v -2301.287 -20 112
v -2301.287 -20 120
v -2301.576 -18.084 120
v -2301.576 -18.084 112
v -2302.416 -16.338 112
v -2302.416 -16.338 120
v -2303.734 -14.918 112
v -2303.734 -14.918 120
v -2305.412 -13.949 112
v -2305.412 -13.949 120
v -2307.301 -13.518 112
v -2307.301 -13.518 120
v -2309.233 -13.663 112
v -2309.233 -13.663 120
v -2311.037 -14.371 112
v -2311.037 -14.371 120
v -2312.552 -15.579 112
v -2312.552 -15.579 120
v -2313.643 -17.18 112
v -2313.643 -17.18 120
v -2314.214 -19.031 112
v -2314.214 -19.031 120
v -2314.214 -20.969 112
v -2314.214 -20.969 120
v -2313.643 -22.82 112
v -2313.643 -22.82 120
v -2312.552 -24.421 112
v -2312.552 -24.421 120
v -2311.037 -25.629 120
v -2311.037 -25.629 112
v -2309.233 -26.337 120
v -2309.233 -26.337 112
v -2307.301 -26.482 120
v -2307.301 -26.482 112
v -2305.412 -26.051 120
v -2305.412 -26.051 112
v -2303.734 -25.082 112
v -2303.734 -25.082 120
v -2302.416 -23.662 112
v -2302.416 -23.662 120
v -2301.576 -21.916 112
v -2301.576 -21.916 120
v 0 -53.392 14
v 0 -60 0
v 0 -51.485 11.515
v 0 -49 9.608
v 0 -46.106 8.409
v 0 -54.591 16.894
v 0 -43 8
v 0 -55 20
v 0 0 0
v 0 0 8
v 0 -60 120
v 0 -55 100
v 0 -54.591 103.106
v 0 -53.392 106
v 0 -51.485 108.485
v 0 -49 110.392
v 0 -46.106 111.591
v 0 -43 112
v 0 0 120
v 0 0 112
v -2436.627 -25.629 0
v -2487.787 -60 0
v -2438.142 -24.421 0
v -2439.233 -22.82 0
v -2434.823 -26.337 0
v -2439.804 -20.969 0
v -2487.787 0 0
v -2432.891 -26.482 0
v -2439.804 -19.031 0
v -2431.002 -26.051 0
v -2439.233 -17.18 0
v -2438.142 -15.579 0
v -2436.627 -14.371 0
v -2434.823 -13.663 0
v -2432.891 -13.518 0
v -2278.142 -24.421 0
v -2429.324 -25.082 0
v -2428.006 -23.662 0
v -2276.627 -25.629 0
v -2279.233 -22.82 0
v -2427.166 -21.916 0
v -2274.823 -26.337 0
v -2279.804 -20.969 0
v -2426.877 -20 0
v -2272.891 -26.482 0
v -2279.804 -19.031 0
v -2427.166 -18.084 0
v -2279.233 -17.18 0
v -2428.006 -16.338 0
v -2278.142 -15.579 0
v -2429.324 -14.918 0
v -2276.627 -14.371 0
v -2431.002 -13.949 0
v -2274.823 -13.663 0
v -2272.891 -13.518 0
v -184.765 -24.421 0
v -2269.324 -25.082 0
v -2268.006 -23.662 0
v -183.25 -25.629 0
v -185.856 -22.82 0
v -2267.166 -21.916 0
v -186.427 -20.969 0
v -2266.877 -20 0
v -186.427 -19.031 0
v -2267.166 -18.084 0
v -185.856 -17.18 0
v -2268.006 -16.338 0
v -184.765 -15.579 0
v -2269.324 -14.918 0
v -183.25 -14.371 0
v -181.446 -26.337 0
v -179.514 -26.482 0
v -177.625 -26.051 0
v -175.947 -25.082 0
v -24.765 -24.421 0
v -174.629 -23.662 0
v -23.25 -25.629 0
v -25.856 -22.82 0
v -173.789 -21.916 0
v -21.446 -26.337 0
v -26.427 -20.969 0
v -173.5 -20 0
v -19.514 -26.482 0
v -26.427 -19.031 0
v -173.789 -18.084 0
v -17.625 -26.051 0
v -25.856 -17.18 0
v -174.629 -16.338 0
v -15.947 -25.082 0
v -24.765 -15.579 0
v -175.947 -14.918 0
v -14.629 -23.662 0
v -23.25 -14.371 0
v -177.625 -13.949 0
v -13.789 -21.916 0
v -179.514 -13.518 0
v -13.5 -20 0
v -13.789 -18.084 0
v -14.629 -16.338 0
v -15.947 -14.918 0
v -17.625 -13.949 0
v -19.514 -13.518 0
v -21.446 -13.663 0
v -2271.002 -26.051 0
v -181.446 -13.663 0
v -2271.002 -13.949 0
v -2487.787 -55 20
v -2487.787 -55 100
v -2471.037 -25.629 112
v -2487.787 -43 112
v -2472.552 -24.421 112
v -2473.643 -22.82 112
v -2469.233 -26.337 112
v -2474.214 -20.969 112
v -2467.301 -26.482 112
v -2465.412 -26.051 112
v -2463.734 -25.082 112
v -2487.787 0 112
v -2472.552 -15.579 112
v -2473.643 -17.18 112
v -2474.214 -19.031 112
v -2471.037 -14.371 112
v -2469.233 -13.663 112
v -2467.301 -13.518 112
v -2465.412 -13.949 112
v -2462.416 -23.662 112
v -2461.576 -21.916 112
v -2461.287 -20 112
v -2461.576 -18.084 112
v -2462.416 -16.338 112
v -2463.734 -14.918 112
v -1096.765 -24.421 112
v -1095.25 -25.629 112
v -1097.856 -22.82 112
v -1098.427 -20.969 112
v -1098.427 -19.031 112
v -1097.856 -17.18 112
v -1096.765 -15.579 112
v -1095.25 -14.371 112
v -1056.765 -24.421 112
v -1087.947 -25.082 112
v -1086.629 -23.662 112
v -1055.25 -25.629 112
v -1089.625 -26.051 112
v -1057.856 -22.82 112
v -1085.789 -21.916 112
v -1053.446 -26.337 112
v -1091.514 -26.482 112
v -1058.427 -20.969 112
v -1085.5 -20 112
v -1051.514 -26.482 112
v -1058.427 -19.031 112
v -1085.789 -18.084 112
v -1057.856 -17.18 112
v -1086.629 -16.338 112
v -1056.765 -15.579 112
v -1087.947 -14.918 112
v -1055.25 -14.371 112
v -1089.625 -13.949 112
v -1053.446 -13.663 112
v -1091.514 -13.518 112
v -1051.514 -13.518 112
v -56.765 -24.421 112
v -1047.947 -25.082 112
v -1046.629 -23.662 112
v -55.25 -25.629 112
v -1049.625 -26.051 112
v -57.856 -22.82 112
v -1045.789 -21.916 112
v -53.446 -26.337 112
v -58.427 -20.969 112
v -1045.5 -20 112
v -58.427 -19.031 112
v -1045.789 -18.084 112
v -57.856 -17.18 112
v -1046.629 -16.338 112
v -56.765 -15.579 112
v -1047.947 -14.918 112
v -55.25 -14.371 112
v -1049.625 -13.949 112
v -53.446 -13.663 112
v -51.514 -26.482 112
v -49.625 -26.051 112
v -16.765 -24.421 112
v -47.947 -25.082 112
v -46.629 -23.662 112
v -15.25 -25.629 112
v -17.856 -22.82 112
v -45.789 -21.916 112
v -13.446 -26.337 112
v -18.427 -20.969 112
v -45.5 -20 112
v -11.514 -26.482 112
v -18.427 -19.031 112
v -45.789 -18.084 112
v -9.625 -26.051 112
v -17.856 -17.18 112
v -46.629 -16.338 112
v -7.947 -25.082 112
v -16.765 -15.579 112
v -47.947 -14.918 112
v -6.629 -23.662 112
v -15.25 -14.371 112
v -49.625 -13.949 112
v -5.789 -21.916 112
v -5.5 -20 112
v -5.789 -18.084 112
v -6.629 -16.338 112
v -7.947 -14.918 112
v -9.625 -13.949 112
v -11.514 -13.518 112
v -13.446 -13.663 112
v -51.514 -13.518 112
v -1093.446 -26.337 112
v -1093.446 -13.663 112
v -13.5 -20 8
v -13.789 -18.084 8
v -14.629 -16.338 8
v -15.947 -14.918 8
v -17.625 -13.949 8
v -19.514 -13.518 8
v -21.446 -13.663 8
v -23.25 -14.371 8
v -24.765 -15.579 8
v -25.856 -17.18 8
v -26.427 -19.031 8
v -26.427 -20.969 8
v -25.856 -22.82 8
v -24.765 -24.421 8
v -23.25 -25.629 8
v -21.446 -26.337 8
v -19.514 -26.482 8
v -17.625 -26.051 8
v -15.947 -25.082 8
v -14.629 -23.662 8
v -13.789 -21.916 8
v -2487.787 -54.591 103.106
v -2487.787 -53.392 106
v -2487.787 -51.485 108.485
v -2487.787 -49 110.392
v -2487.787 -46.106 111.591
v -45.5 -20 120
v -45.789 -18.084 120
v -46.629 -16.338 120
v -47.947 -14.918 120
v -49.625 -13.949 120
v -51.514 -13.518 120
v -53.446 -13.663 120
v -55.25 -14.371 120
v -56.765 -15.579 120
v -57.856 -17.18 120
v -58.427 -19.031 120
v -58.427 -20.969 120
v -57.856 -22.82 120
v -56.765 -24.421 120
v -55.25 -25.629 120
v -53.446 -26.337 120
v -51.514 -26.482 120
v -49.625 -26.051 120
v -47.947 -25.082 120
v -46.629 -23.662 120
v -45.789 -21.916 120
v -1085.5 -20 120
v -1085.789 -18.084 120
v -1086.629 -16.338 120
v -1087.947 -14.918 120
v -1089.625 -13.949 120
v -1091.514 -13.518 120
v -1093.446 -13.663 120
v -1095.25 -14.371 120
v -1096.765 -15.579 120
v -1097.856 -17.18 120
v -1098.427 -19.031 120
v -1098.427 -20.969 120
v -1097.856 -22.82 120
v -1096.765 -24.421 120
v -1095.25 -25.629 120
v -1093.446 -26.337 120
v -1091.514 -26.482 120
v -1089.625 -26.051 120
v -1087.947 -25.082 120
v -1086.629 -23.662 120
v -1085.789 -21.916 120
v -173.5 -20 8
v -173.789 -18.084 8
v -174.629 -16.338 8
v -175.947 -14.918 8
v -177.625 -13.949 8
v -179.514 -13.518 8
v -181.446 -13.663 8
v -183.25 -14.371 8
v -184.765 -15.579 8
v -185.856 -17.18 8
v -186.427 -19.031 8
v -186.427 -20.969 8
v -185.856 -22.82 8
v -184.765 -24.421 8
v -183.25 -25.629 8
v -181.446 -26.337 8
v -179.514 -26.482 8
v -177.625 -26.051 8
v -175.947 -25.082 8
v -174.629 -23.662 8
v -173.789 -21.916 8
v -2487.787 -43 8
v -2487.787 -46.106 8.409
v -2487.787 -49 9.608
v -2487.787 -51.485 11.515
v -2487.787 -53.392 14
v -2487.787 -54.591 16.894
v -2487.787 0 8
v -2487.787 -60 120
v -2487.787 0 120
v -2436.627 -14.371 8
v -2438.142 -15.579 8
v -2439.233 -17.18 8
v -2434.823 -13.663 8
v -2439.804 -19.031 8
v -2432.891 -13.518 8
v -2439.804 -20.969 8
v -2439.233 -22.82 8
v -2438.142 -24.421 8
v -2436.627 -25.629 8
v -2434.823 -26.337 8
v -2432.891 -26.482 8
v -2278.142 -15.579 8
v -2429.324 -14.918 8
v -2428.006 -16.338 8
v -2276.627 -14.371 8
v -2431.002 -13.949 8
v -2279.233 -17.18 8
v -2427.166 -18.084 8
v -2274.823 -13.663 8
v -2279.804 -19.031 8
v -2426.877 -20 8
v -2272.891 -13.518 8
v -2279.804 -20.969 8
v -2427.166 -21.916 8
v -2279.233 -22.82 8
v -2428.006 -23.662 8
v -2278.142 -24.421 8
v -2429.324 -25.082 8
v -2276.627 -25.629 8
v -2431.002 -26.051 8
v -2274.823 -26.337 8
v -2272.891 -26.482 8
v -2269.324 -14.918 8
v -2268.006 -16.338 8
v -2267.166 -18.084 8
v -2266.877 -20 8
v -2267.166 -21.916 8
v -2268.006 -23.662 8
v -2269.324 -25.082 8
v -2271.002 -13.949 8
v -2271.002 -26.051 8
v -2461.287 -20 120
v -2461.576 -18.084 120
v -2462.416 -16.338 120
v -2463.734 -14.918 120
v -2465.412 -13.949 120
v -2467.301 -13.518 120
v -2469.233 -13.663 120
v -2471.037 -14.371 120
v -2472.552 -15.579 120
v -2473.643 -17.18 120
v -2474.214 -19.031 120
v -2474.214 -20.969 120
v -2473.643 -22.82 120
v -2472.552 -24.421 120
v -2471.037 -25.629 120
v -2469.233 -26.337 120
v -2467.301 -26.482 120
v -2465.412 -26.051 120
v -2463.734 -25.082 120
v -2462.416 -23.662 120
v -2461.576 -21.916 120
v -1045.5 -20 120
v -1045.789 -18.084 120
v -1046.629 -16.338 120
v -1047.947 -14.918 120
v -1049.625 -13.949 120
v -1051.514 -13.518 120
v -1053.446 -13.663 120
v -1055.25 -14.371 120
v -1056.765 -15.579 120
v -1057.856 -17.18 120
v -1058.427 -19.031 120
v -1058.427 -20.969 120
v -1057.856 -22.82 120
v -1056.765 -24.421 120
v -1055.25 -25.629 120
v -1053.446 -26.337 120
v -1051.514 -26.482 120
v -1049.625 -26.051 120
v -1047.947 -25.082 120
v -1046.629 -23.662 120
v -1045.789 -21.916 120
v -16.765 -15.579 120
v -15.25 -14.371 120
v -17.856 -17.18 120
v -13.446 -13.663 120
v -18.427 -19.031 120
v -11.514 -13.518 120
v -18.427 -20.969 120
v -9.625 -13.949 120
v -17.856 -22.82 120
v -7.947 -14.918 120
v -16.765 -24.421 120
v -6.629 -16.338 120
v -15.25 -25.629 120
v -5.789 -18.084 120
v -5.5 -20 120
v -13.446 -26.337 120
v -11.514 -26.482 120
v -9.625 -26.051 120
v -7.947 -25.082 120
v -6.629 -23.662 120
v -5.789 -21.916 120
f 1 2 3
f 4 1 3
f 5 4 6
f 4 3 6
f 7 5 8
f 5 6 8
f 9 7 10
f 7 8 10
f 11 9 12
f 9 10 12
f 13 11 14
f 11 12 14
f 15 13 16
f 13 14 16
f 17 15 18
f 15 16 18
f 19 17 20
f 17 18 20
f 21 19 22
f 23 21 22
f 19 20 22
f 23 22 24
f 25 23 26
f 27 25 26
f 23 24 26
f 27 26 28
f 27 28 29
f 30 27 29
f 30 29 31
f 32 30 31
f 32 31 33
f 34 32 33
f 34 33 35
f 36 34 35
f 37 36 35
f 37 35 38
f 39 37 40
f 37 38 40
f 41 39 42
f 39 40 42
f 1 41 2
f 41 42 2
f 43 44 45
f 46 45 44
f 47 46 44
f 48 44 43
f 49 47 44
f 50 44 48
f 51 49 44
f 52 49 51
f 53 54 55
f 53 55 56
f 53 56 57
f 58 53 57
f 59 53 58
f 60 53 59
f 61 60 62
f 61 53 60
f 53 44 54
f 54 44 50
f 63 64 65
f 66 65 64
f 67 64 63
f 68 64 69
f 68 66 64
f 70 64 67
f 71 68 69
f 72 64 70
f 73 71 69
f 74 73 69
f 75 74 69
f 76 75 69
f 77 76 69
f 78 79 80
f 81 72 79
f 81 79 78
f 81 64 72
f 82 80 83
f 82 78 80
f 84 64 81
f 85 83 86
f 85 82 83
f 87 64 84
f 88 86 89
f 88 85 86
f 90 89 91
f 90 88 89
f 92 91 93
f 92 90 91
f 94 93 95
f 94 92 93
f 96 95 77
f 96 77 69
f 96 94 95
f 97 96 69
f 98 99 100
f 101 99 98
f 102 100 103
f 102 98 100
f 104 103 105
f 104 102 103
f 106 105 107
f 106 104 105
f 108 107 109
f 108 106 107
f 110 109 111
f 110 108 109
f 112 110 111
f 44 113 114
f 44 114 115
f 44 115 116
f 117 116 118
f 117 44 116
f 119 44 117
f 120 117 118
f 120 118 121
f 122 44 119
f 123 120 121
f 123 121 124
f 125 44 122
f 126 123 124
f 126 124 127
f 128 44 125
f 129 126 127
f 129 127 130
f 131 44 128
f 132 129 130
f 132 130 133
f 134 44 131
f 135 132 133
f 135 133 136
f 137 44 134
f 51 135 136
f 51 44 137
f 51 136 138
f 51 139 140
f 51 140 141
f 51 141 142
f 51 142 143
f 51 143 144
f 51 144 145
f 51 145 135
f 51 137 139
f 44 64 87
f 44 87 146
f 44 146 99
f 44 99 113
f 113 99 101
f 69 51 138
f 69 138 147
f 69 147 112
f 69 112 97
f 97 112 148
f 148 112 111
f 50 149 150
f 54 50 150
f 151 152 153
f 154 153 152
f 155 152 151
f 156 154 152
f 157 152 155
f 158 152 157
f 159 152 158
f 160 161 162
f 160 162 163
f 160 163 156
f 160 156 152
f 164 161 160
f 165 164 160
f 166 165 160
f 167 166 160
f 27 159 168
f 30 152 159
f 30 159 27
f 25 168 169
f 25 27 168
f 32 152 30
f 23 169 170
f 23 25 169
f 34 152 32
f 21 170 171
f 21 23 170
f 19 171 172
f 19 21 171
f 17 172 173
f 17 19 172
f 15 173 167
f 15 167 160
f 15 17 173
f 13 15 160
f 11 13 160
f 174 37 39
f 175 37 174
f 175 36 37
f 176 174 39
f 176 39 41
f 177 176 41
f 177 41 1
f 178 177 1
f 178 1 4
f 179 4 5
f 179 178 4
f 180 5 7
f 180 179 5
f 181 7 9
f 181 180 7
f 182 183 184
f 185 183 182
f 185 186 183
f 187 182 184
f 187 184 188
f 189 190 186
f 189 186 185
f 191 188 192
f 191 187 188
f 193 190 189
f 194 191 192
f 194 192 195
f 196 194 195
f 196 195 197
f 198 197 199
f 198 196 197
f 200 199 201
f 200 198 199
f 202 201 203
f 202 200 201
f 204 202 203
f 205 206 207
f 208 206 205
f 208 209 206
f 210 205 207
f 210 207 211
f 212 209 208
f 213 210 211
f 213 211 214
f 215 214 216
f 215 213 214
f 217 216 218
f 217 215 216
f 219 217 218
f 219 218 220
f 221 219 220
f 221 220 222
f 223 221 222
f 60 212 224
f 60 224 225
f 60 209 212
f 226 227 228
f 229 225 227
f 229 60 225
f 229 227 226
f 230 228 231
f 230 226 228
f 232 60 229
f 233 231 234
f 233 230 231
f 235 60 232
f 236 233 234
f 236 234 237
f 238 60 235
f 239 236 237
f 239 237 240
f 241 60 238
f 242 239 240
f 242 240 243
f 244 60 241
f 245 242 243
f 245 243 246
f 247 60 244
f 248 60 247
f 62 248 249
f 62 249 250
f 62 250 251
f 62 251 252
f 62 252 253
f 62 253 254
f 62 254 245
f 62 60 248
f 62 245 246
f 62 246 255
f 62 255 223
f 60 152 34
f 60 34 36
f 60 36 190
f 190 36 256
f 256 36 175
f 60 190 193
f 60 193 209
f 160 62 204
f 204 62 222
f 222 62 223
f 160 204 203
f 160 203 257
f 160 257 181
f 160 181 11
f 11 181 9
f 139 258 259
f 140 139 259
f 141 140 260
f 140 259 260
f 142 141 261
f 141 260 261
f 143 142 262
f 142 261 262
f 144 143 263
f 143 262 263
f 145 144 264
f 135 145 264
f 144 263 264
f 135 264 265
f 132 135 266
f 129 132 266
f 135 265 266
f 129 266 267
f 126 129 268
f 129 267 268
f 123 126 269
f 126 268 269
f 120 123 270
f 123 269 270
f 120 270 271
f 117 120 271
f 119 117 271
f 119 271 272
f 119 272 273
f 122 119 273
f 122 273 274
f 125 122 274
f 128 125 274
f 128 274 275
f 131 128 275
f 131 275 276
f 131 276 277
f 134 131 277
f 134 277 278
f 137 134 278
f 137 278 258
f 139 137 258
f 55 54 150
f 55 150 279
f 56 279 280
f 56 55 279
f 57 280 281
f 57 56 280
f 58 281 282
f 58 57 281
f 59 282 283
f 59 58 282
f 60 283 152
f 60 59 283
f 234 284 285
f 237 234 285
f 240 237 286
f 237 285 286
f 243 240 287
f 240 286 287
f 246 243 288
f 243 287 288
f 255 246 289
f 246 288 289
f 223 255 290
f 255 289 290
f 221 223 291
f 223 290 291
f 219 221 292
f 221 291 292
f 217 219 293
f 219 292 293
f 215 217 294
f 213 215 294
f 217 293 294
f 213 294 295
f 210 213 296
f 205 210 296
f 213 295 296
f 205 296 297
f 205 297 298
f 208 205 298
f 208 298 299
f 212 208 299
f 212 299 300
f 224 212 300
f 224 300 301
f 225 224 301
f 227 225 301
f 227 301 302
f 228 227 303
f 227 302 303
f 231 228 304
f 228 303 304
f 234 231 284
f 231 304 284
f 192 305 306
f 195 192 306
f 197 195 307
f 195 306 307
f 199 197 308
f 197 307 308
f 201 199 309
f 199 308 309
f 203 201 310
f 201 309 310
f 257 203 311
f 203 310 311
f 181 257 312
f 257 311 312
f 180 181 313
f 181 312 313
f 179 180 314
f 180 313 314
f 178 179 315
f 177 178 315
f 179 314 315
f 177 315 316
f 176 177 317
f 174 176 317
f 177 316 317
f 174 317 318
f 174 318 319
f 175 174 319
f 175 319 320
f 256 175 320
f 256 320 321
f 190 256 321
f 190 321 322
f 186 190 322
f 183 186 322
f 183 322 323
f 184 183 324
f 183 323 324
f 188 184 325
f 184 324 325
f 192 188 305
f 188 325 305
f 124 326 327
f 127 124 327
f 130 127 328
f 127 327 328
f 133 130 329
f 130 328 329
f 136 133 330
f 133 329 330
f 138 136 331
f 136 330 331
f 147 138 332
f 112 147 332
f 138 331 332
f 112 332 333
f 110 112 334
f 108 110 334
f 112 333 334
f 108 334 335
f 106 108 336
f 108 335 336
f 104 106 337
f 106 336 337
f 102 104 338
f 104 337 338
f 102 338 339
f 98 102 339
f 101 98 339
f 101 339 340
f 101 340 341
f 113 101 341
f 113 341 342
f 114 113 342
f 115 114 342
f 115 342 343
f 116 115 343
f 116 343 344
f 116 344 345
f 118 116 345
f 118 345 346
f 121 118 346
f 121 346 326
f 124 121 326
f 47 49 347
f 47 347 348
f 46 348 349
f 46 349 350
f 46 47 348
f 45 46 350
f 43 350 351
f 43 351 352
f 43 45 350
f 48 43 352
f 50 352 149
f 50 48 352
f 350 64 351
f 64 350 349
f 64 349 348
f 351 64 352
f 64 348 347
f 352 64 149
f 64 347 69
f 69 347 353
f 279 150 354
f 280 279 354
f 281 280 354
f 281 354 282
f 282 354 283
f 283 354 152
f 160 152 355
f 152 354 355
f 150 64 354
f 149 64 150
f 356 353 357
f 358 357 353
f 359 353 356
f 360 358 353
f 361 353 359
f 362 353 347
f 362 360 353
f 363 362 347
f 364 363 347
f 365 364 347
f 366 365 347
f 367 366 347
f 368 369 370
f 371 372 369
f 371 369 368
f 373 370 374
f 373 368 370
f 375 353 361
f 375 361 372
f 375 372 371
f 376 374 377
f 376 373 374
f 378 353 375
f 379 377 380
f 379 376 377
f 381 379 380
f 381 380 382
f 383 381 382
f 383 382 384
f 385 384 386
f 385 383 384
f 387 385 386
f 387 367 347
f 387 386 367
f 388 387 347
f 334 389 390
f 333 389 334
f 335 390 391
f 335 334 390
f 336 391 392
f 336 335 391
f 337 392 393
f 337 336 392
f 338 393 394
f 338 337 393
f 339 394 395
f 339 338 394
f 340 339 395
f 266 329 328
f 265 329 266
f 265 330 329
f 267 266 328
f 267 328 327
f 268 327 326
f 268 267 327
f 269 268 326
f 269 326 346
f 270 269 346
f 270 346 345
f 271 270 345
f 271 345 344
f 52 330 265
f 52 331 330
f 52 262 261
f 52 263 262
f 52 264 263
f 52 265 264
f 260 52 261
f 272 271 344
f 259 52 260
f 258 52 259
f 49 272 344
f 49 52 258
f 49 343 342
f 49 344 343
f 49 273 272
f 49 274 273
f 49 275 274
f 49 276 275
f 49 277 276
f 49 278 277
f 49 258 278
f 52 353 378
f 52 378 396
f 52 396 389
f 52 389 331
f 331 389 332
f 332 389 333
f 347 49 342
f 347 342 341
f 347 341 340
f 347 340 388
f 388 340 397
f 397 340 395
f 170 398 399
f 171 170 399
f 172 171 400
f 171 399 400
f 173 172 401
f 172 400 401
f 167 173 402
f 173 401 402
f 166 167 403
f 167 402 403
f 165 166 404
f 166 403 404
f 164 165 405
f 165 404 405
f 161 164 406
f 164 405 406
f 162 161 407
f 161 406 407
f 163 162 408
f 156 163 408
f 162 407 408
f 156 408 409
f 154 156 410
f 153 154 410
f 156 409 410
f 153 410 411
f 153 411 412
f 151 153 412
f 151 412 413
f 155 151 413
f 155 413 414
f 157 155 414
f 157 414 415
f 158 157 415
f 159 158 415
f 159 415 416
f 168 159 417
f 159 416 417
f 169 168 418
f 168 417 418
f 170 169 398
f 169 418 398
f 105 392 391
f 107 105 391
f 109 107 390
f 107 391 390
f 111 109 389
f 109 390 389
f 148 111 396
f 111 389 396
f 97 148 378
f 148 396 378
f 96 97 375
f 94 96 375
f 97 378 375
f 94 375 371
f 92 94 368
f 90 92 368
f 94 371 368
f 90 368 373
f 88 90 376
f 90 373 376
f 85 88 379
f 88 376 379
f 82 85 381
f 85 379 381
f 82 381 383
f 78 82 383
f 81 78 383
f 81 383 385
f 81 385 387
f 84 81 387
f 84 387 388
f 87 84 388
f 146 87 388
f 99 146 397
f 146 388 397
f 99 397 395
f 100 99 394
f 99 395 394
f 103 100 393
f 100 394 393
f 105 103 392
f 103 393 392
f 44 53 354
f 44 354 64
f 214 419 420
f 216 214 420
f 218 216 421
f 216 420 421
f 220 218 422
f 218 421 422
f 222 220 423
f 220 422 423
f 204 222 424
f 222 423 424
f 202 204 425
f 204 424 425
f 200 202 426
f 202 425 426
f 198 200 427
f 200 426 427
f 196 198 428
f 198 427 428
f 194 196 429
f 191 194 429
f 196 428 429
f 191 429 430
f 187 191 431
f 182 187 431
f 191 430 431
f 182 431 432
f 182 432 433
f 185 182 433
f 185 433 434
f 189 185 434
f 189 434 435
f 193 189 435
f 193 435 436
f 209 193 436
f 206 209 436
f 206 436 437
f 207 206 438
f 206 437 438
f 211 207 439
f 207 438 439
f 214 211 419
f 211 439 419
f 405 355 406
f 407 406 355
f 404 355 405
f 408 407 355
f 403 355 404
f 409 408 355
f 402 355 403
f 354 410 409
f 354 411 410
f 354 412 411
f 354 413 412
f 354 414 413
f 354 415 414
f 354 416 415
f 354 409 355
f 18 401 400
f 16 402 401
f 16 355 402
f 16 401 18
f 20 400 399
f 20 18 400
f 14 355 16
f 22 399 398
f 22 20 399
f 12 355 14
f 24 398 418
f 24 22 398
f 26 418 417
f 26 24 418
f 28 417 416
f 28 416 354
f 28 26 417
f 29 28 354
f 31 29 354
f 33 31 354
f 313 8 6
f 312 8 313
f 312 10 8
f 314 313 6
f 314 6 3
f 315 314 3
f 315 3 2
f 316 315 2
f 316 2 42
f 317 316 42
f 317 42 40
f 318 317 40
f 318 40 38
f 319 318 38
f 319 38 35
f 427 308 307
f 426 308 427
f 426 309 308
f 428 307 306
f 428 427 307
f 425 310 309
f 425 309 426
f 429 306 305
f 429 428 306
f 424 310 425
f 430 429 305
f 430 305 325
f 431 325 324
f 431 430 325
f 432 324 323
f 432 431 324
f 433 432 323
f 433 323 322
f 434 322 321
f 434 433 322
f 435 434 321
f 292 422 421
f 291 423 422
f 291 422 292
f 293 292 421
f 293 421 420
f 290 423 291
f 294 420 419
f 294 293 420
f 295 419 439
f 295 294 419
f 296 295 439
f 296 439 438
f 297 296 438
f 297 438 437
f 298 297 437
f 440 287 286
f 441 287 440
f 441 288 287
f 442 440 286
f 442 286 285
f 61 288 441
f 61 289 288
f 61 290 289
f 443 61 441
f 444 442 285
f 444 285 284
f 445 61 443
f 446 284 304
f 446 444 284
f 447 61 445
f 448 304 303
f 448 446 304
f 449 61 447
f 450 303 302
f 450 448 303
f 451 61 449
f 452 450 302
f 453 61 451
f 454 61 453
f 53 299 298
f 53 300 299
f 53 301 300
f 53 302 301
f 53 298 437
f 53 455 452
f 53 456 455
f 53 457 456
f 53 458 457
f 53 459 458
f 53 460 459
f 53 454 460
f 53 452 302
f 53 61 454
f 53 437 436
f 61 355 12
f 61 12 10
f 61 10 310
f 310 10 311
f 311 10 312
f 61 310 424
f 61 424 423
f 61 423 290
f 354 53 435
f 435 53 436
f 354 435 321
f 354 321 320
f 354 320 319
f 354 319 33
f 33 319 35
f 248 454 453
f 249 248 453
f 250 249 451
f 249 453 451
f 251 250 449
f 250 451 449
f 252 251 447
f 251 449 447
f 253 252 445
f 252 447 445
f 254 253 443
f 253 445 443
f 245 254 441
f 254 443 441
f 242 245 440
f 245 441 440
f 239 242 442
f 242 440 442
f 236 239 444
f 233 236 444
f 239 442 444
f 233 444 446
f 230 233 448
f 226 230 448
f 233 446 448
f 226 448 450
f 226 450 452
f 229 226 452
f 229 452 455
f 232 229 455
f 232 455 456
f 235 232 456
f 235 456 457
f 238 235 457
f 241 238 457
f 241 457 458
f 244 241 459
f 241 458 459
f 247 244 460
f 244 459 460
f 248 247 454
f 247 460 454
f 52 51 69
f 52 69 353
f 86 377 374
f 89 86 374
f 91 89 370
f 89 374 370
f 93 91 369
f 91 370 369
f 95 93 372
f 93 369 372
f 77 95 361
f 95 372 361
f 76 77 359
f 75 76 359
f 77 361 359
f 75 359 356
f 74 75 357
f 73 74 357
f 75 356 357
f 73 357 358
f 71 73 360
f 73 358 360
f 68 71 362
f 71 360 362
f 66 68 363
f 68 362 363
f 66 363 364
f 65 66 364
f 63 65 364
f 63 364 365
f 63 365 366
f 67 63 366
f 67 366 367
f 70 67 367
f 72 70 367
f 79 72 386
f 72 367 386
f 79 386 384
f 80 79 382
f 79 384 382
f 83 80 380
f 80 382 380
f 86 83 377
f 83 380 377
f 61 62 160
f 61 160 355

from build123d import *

# Parameters (mm, degrees)
F3_DEPTH   = 2487.787
F4_R       = 6.5
F5_DEPTH   = 8
F3_FACE2_W = 2487.787
F3_FACE2_H = 60
F3_FACE2_R = 6.5
F7_DEPTH   = 8.001
F6_R       = 6.5
F8_DEPTH   = 8


with BuildPart() as f3:
    # F2 (on Right) → F3 (new body)
    with BuildSketch(Plane.YZ):
        with BuildLine():
            Line((-60, 0), (0, 0))
            Line((0, 0), (0, 8))
            Line((0, 8), (-43, 8))
            ThreePointArc((-43, 8), (-51.4852813742, 11.5147186258), (-55, 20))
            Line((-55, 20), (-55, 100))
            ThreePointArc((-55, 100), (-51.4852813742, 108.4852813742), (-43, 112))
            Line((-43, 112), (0, 112))
            Line((0, 112), (0, 120))
            Line((0, 120), (-60, 120))
            Line((-60, 120), (-60, 0))
        make_face()
    extrude(amount=-F3_DEPTH)

    # F4 (on face) → F5 (cut, through all)
    with BuildSketch(Plane.XY.offset(8)):
        with Locations((-2273.377, -20)):
            Circle(F4_R)
        with Locations((-2433.377, -20)):
            Circle(F4_R)
    extrude(amount=-F5_DEPTH, mode=Mode.SUBTRACT)

    # F4 (on face) + F3_face2 (on face) → F7 (cut, through all)
    with BuildSketch(Plane.XY.offset(8)):
        with Locations((-20, -20)):
            Circle(F4_R)
        with Locations((-180, -20)):
            Circle(F4_R)
        with Locations((-2433.377, -20)):
            Circle(F4_R)
        with Locations((-2273.377, -20)):
            Circle(F4_R)
    with BuildSketch(Plane(origin=(-1241.9168214726, -30.0178162048, 0), x_dir=(1, 0, 0), z_dir=(0, 0, -1))):
        with Locations((-1.9766785274, -0.0178162048)):
            Rectangle(F3_FACE2_W, F3_FACE2_H)
        with Locations((-1191.4601785274, -10.0178162048)):
            Circle(F3_FACE2_R, mode=Mode.SUBTRACT)
        with Locations((-1031.4601785274, -10.0178162048)):
            Circle(F3_FACE2_R, mode=Mode.SUBTRACT)
    extrude(amount=-F7_DEPTH, dir=(0, 0, 1), mode=Mode.SUBTRACT)

    # F6 (on face) → F8 (cut, through all)
    with BuildSketch(Plane.XY.offset(120)):
        with Locations((-52, -20)):
            Circle(F6_R)
        with Locations((-12, -20)):
            Circle(F6_R)
        with Locations((-1052, -20)):
            Circle(F6_R)
        with Locations((-1092, -20)):
            Circle(F6_R)
        with Locations((-2307.787, -20)):
            Circle(F6_R)
        with Locations((-2467.787, -20)):
            Circle(F6_R)
    extrude(amount=-F8_DEPTH, mode=Mode.SUBTRACT)


solid = f3.part
